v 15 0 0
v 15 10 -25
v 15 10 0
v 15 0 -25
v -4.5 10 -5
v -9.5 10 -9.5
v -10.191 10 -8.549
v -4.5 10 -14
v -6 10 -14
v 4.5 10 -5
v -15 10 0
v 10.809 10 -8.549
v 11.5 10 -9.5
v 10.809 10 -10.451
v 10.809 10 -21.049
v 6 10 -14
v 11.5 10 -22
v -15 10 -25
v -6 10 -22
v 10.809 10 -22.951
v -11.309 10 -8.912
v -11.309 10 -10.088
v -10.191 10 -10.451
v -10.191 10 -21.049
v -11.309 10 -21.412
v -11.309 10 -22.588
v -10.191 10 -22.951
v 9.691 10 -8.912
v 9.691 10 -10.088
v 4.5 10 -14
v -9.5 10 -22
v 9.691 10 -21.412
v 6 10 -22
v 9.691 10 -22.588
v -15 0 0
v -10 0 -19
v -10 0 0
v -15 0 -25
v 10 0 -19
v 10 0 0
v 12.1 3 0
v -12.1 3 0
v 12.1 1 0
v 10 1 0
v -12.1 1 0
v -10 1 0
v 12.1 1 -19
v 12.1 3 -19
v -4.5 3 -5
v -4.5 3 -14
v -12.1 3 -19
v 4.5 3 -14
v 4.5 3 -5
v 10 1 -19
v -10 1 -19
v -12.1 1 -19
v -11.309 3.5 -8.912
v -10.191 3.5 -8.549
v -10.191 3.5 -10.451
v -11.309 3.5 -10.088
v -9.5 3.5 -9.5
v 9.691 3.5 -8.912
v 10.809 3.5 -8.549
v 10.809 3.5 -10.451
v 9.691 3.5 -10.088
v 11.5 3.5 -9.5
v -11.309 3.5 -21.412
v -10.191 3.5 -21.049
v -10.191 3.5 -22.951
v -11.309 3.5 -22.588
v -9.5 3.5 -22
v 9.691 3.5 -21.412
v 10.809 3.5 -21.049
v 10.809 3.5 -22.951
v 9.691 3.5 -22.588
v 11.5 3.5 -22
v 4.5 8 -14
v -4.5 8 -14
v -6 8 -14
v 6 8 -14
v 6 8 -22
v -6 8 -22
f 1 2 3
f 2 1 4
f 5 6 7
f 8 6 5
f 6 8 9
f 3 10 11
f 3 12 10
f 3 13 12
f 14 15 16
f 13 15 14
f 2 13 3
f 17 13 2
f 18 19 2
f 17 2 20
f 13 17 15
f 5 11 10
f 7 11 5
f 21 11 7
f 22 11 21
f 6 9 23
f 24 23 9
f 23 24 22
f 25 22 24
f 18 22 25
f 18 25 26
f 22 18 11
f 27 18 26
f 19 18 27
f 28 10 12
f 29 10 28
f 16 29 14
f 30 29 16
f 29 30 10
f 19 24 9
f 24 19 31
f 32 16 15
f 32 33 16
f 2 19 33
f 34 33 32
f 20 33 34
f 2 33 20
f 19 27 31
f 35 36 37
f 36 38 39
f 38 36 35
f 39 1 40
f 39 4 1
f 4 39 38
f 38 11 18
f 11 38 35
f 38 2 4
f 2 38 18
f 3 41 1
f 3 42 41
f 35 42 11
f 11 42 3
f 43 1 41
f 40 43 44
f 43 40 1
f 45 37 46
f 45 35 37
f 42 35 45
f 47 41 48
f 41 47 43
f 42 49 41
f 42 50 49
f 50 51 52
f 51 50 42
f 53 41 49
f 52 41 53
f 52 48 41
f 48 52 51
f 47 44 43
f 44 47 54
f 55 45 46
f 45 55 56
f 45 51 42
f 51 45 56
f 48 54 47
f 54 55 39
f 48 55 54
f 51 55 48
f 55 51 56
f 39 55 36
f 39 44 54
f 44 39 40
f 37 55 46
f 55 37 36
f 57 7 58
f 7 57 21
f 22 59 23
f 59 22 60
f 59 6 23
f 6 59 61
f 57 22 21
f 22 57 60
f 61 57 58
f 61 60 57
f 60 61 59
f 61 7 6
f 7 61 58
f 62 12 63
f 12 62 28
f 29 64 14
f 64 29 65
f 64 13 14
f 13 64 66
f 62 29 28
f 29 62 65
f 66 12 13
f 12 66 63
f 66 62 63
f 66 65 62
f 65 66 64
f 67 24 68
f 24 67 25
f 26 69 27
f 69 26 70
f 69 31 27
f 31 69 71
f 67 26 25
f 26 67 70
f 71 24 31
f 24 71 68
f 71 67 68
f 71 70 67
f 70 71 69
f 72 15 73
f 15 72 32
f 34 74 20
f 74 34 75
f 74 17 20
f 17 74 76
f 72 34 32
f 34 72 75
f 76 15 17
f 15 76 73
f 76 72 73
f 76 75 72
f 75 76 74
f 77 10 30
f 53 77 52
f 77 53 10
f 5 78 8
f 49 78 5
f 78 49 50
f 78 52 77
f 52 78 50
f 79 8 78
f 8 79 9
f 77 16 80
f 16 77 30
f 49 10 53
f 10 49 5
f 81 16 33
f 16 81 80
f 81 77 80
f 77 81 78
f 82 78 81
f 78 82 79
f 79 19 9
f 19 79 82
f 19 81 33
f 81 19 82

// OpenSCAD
picamera_holespace1 = 21;
picamera_holespace2 = 12.5;
picamera_holed = 2;
mount_depth = 10;

rotate([-90,0,0])
difference()
{
   translate([-15,0,0])
     cube([30,25,mount_depth]);
   translate([-12.1,0,1])
     cube([24.2,19,2]);
   translate([-10,0,0])
     cube([20,19,1]);
   translate([-picamera_holespace1/2, 9.5,3.5])
     cylinder(r=picamera_holed/2,h=mount_depth);
   translate([picamera_holespace1/2, 9.5,3.5])
     cylinder(r=picamera_holed/2,h=mount_depth);
   translate([-picamera_holespace1/2, 9.5+picamera_holespace2,3.5])
     cylinder(r=picamera_holed/2,h=mount_depth);
   translate([picamera_holespace1/2, 9.5+picamera_holespace2,3.5])
     cylinder(r=picamera_holed/2,h=mount_depth);
   translate([-4.5,9.5-4.5,0])
     cube([9,9,mount_depth]);
   translate([-6,9.5-4.5+9,mount_depth-2])
     cube([12,8,2]);
  }
